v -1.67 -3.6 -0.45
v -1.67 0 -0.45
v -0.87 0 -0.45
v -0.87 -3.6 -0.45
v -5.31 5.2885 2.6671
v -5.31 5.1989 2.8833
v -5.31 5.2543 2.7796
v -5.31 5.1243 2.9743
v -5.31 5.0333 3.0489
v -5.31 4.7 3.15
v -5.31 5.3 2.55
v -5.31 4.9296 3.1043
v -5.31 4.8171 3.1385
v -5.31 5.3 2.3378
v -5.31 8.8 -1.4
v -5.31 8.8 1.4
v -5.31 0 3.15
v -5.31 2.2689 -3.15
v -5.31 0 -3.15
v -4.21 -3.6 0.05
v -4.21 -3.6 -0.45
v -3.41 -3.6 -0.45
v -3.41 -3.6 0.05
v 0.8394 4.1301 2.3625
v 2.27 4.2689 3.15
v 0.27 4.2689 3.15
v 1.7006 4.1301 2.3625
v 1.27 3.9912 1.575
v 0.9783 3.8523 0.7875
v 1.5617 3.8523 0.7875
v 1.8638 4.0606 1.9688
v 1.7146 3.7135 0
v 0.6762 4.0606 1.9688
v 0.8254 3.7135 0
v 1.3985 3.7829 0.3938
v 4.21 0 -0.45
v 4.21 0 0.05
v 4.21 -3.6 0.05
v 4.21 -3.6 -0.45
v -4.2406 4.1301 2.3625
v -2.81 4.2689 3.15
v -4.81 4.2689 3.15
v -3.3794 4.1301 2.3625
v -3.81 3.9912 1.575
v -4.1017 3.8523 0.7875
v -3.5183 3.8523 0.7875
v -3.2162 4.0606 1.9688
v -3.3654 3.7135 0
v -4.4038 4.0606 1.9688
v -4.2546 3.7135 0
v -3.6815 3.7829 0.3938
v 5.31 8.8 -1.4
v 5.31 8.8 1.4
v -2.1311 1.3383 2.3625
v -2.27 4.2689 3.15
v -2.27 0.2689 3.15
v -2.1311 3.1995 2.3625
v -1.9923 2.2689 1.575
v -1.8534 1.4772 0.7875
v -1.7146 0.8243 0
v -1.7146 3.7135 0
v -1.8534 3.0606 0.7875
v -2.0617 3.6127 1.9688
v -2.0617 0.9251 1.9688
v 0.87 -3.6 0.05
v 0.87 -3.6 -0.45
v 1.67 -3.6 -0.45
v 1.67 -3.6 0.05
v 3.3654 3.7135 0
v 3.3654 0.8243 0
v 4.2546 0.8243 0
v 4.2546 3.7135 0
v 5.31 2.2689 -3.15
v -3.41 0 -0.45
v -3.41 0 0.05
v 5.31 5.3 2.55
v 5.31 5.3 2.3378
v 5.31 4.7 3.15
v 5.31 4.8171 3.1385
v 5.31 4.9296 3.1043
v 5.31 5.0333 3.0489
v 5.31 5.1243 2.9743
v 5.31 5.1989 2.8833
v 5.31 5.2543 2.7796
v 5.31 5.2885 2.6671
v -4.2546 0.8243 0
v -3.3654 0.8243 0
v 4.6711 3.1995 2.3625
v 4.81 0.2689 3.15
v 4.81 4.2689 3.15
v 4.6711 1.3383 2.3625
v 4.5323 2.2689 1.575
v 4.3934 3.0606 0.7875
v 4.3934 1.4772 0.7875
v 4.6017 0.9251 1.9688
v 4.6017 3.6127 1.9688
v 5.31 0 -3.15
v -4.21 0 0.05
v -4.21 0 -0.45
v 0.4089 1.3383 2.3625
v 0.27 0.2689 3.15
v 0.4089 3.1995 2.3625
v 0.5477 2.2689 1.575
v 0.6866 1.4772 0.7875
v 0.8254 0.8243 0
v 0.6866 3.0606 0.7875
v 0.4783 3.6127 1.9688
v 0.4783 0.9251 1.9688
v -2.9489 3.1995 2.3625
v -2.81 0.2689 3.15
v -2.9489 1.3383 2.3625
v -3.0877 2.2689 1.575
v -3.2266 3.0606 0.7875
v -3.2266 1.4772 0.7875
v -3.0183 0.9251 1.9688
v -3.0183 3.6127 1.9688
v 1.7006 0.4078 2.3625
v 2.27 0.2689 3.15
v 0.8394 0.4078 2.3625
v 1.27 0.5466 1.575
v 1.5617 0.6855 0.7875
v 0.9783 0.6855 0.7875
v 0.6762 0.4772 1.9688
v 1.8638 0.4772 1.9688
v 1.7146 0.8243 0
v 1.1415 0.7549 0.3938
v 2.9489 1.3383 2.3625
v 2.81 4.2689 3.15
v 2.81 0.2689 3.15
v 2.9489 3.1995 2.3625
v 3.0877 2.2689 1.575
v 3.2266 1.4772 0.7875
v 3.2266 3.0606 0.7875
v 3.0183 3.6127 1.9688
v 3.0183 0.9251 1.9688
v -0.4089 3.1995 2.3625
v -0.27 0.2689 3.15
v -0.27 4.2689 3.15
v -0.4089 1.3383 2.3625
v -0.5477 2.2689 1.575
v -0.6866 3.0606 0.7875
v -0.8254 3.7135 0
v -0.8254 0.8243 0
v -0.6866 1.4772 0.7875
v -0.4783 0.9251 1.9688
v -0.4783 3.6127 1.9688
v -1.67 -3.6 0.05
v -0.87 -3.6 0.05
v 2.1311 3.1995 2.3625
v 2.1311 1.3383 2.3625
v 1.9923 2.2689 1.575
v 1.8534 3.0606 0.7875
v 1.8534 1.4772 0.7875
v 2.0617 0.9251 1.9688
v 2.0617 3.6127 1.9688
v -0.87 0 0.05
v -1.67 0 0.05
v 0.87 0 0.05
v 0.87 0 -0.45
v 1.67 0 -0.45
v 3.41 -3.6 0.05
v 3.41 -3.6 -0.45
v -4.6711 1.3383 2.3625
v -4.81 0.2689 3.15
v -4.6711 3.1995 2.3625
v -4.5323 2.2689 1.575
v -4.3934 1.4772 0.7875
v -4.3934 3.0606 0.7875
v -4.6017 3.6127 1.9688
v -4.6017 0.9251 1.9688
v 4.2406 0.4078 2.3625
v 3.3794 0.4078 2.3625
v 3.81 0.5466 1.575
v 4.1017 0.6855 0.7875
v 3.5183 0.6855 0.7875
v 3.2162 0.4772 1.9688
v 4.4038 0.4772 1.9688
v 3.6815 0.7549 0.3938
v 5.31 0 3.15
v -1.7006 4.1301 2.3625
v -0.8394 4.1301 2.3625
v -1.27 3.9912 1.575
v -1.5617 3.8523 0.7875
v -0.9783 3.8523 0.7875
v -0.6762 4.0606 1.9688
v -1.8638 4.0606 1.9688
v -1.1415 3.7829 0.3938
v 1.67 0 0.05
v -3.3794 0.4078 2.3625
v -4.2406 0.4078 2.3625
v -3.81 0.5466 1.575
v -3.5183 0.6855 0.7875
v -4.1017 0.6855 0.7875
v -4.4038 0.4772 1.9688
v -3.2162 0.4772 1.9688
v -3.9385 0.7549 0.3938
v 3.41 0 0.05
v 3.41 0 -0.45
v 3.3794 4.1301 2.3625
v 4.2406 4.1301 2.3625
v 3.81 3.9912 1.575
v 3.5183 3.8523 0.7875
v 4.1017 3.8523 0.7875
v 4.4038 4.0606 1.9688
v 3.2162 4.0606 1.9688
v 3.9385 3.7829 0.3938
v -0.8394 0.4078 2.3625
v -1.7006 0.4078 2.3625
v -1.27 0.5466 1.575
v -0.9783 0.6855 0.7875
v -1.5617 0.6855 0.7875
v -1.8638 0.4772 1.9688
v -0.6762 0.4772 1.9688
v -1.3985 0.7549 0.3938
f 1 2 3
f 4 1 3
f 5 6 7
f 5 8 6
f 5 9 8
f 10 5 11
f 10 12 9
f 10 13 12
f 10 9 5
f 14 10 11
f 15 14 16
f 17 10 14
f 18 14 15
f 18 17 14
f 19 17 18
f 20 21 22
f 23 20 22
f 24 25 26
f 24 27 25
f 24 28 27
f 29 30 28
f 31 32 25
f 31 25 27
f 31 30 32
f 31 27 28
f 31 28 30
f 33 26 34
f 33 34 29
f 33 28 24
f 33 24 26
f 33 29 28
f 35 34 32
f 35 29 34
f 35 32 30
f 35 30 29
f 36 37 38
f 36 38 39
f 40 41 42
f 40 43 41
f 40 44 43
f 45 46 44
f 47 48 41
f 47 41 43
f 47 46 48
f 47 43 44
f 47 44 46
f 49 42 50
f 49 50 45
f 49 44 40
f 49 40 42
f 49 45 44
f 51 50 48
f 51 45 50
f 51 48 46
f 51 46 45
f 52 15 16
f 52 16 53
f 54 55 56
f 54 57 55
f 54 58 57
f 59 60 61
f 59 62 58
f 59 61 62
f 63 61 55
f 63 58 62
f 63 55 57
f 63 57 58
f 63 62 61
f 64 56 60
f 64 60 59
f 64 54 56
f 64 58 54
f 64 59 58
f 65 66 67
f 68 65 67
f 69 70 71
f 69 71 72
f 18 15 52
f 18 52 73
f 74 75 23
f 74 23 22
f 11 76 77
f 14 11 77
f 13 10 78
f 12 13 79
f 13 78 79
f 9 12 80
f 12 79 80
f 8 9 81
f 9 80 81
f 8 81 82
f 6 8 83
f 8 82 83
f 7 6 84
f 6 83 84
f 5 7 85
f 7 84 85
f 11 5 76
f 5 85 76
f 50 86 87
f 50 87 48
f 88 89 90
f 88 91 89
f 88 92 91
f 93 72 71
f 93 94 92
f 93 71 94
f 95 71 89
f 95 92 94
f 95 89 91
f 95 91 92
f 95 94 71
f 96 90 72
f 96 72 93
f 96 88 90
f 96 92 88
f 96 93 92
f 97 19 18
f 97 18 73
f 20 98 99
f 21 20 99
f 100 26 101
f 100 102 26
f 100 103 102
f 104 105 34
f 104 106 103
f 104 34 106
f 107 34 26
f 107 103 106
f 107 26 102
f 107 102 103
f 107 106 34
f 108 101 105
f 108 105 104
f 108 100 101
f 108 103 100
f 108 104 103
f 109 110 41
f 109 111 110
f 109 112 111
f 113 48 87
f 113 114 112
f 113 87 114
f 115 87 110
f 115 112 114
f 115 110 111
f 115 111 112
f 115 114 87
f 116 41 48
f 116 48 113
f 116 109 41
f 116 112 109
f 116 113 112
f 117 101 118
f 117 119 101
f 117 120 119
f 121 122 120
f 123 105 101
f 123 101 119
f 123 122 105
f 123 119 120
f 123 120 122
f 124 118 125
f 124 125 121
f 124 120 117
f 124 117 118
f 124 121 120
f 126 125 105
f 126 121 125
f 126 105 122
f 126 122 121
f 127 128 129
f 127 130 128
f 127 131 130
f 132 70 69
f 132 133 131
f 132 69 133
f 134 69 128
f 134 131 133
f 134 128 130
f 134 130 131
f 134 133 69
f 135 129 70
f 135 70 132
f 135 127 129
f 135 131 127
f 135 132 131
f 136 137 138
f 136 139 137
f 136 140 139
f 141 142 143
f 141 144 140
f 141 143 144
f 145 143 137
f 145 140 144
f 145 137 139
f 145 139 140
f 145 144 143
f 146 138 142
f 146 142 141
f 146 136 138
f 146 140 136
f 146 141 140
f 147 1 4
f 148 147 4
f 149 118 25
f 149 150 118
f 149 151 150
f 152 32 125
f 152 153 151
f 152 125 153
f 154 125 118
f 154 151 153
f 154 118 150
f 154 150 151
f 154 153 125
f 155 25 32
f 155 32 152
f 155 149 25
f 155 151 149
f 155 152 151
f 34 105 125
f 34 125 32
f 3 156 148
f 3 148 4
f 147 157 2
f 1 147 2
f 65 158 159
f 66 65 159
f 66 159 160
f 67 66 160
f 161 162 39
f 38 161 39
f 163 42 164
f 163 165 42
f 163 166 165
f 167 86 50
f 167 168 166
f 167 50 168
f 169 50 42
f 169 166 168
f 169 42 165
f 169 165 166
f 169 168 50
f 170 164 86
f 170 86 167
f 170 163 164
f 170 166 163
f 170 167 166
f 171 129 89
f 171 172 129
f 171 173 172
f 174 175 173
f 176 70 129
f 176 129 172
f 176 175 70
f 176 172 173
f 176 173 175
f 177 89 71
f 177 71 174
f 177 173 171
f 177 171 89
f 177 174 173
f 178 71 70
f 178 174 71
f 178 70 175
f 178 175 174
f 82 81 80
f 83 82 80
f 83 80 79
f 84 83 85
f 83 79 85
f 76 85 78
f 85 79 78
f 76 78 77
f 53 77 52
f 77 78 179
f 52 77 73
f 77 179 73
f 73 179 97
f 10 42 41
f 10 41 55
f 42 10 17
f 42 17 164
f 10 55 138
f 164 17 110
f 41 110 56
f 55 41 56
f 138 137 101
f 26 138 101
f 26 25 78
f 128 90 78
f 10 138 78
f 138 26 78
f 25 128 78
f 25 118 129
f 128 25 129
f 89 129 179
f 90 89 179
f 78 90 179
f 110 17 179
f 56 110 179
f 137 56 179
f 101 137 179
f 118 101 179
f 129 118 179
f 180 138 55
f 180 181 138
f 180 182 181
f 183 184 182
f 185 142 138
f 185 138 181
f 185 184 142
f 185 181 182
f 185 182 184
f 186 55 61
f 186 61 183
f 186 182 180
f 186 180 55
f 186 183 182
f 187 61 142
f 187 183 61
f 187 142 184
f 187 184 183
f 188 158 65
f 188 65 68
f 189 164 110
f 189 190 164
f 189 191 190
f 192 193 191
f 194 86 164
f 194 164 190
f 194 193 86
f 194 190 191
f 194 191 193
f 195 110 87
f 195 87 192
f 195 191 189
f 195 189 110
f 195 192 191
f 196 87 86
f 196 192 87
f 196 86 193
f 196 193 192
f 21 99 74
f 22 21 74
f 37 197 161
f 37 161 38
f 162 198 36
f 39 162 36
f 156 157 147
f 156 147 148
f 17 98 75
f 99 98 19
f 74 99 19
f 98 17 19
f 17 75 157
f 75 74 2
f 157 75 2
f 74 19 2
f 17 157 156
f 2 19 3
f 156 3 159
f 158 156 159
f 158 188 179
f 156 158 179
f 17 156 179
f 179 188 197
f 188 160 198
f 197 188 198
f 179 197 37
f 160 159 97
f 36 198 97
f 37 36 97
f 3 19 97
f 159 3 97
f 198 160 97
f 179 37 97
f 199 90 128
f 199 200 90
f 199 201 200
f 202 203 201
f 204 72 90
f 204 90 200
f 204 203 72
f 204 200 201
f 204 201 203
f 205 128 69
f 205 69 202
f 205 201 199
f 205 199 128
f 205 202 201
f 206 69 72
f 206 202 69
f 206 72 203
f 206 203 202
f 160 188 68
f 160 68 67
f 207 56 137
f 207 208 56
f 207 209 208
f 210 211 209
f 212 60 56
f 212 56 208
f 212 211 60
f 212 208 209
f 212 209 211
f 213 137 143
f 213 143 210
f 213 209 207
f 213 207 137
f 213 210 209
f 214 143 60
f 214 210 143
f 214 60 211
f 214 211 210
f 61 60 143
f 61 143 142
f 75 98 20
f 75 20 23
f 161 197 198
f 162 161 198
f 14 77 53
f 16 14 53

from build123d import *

# Parameters (mm, degrees)
SKETCH1_W           = 10.62
SKETCH1_H           = 6.3
BOSS_EXTRUDE1_DEPTH = 8.8
SKETCH2_W           = 0.8
SKETCH2_H           = 0.5
BOSS_EXTRUDE2_DEPTH = 3.6
CUT_EXTRUDE1_REACH  = 12.62
SKETCH4_W           = 2
SKETCH4_H           = 4
CUT_EXTRUDE2_DEPTH  = 3.15
CUT_EXTRUDE2_TAPER  = 10


with BuildPart() as part:
    # Sketch1 → Boss-Extrude1 (new body)
    with BuildSketch(Plane(origin=(0, 0, 0), x_dir=(1, 0, 0), z_dir=(0, 1, 0))):
        Rectangle(SKETCH1_W, SKETCH1_H)
    extrude(amount=BOSS_EXTRUDE1_DEPTH)

    # Sketch2 → Boss-Extrude2 (add)
    with BuildSketch(Plane(origin=(0, 0, 0), x_dir=(1, 0, 0), z_dir=(0, 1, 0))):
        with Locations((1.27, 0.2)):
            Rectangle(SKETCH2_W, SKETCH2_H)
        with Locations((3.81, 0.2)):
            Rectangle(SKETCH2_W, SKETCH2_H)
        with Locations((-1.27, 0.2)):
            Rectangle(SKETCH2_W, SKETCH2_H)
        with Locations((-3.81, 0.2)):
            Rectangle(SKETCH2_W, SKETCH2_H)
    extrude(amount=-BOSS_EXTRUDE2_DEPTH)

    # Sketch3 → Cut-Extrude1 (cut, up to next)
    with BuildSketch(Plane(origin=(5.31, 0, 0), x_dir=(0, 0, -1), z_dir=(1, 0, 0)), mode=Mode.PRIVATE) as cut_extrude1_sk1:
        with BuildLine():
            ThreePointArc((-3.15, 4.7), (-2.974264069, 5.124264069), (-2.55, 5.3))
            Line((-2.55, 5.3), (-2.337822174, 5.3))
            Line((-2.337822174, 5.3), (-1.4, 8.8))
            Line((-1.4, 8.8), (-3.15, 8.8))
            Line((-3.15, 8.8), (-3.15, 4.7))
        make_face()
    cut_extrude1_tool1 = extrude(cut_extrude1_sk1.sketch, amount=-CUT_EXTRUDE1_REACH, mode=Mode.PRIVATE) & part.part
    add(cut_extrude1_tool1.solids().sort_by_distance((5.31, 7.227986, 2.489914))[0], mode=Mode.SUBTRACT)
    # Sketch3 → Cut-Extrude1 (cut, up to next)
    with BuildSketch(Plane(origin=(5.31, 0, 0), x_dir=(0, 0, -1), z_dir=(1, 0, 0)), mode=Mode.PRIVATE) as cut_extrude1_sk2:
        Polygon((3.15, 8.8), (1.4, 8.8), (3.15, 2.268911087), align=None)
    cut_extrude1_tool2 = extrude(cut_extrude1_sk2.sketch, amount=-CUT_EXTRUDE1_REACH, mode=Mode.PRIVATE) & part.part
    add(cut_extrude1_tool2.solids().sort_by_distance((5.31, 6.62297, -2.566667))[0], mode=Mode.SUBTRACT)

    # Sketch4 → Cut-Extrude2 (cut)
    with BuildSketch(Plane.XY.offset(3.15)):
        with Locations((-3.81, 2.268911087)):
            Rectangle(SKETCH4_W, SKETCH4_H)
        with Locations((-1.27, 2.268911087)):
            Rectangle(SKETCH4_W, SKETCH4_H)
        with Locations((1.27, 2.268911087)):
            Rectangle(SKETCH4_W, SKETCH4_H)
        with Locations((3.81, 2.268911087)):
            Rectangle(SKETCH4_W, SKETCH4_H)
    extrude(amount=-CUT_EXTRUDE2_DEPTH, taper=CUT_EXTRUDE2_TAPER, mode=Mode.SUBTRACT)


solid = part.part
